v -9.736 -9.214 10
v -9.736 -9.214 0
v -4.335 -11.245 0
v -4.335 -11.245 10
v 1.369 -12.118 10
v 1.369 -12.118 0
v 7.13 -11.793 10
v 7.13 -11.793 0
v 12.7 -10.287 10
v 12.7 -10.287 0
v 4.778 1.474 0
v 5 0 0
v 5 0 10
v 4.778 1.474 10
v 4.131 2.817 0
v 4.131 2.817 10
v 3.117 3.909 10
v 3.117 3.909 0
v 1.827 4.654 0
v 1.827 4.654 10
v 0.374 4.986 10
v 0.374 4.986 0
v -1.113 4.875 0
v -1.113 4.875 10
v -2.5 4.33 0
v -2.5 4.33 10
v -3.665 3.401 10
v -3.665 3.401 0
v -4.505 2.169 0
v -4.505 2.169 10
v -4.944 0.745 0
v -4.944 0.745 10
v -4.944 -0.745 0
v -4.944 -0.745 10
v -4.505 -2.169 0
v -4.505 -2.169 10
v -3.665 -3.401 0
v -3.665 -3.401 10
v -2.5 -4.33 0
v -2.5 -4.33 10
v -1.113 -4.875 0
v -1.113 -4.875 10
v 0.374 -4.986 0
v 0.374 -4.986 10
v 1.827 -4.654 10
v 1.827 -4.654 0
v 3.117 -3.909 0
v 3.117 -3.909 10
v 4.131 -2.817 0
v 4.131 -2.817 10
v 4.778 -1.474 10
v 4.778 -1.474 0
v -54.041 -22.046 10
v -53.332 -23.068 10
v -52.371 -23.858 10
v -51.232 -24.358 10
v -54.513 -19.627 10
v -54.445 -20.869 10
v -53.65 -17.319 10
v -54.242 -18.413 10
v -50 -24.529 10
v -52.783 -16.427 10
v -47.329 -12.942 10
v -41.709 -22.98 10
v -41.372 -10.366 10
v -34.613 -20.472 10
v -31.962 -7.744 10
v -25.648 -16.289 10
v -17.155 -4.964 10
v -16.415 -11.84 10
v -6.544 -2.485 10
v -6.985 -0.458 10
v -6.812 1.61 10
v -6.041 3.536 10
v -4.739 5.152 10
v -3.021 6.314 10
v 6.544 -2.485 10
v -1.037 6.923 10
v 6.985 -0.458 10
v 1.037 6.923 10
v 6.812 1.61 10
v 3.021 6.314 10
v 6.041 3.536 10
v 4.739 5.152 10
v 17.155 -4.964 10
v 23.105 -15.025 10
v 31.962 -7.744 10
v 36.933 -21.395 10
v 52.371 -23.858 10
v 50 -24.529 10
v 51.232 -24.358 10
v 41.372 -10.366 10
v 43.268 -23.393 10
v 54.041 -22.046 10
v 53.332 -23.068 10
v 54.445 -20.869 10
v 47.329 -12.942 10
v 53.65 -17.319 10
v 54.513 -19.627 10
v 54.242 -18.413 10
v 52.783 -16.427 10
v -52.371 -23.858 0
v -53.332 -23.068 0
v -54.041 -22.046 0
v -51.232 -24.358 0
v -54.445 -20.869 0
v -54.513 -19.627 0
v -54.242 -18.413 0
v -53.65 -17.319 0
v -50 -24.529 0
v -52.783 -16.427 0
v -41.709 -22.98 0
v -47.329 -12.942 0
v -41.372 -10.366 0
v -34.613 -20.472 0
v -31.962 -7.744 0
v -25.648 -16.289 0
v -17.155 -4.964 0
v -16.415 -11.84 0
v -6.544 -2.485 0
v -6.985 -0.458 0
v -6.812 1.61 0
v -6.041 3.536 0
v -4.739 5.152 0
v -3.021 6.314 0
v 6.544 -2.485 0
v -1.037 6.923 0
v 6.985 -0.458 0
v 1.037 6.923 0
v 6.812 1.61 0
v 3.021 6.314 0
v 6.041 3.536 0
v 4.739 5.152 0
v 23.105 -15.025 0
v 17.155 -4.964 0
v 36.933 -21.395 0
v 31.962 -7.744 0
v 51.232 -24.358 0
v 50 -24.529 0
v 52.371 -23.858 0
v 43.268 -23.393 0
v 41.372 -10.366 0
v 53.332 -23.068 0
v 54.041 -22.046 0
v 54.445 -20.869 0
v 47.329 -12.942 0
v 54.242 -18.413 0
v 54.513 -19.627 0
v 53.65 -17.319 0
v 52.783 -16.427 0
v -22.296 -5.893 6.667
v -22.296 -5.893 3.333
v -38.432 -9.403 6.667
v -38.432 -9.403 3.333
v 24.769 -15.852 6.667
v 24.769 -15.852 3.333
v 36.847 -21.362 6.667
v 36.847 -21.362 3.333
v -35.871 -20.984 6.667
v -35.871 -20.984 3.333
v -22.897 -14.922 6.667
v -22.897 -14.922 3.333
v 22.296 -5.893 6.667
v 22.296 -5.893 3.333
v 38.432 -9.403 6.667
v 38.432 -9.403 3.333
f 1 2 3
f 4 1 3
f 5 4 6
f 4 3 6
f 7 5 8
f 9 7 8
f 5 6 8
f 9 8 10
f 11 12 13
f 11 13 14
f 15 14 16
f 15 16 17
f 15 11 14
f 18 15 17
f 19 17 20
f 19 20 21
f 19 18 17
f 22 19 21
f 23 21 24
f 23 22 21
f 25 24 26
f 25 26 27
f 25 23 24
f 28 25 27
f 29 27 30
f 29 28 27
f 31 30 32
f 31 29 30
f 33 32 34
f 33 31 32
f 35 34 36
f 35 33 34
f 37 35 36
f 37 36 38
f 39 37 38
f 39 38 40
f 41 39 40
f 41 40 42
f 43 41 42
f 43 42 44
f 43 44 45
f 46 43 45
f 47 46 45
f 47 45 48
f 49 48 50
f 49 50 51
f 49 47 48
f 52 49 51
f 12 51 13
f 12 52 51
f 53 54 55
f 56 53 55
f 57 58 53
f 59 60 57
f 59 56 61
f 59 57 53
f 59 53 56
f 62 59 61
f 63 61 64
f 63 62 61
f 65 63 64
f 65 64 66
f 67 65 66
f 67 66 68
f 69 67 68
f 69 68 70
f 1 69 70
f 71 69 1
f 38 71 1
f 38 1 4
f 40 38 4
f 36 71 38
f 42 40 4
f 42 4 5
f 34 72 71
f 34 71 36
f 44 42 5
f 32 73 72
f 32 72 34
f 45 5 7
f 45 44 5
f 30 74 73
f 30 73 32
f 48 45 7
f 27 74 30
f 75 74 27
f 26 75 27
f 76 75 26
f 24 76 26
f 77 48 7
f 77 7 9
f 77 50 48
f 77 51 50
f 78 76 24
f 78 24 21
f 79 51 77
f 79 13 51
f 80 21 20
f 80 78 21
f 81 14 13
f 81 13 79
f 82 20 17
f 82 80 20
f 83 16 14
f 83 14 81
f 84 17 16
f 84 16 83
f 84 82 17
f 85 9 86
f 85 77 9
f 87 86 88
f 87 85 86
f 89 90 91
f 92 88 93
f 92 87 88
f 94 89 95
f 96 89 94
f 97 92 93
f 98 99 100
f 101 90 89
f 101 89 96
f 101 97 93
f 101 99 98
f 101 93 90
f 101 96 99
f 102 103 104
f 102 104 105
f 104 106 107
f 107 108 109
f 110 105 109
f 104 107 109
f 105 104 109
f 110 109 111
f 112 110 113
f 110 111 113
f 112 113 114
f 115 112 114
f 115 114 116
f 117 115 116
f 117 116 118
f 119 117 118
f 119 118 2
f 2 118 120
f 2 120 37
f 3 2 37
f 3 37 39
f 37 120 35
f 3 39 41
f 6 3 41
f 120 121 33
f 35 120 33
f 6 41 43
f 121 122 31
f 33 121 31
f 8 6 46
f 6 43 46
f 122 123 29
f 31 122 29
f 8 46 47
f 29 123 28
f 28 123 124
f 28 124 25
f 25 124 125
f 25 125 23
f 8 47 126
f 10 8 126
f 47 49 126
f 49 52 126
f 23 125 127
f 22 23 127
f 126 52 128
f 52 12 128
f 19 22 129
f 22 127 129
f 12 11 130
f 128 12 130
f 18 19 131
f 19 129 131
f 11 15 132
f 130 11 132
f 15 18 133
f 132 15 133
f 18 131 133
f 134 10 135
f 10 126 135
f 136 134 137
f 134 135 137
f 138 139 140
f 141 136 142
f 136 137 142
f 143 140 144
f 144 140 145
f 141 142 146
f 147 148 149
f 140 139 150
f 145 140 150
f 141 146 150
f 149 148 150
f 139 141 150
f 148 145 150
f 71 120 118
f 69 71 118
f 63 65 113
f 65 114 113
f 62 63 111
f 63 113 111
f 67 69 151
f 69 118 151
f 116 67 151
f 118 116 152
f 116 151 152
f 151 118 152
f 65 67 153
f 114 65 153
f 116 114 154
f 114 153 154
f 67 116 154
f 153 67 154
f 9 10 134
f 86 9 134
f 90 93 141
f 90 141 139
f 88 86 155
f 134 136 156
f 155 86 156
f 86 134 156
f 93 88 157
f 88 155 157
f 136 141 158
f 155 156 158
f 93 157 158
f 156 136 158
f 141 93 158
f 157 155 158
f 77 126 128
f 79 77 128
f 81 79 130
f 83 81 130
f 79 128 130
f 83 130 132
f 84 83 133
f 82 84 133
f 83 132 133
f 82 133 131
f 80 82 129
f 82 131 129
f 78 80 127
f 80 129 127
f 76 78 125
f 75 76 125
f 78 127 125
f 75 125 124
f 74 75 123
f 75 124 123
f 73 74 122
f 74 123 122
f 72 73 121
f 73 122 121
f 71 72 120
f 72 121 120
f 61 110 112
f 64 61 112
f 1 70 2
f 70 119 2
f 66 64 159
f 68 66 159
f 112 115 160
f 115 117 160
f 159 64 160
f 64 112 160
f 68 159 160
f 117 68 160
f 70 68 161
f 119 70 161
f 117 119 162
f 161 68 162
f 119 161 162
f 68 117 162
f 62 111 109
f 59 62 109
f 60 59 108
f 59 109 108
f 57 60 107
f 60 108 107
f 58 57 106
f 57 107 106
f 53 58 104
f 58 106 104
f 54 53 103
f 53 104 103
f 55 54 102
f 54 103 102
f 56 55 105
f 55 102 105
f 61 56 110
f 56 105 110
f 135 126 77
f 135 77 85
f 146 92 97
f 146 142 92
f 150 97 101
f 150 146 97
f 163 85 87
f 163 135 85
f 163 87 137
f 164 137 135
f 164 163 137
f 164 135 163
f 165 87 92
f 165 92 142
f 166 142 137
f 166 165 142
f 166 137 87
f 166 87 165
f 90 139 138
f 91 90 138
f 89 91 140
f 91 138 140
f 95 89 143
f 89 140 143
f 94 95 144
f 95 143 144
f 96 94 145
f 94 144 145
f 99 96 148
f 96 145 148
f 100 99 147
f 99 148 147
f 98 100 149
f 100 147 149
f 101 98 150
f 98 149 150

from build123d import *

# Parameters (mm, degrees)
SKETCH1_R           = 5
BOSS_EXTRUDE2_DEPTH = 10


with BuildPart() as part:
    # Sketch1 → Boss-Extrude2 (new body)
    with BuildSketch(Plane.XY):
        with BuildLine():
            ThreePointArc((6.543934444, -2.485341424), (0, 7), (-6.543934444, -2.485341424))
            add(Edge.make_bspline(
                [(-6.543934444, -2.485341424), (-21.380303677, -6.980575662), (-40.047381701, -6.507084717), (-52.782972627, -16.427166435)],
                knots=[0.13340661, 0.13340661, 0.13340661, 0.13340661, 1, 1, 1, 1], degree=3))
            ThreePointArc((-52.782972627, -16.427166435), (-54.283149744, -21.471293509), (-50, -24.528805176))
            add(Edge.make_bspline(
                [(-50, -24.528805176), (-34.847891341, -23.200206491), (-23.436440722, -13.787418989), (-9.736135771, -9.213546422)],
                knots=[0, 0, 0, 0, 0.815262705, 0.815262705, 0.815262705, 0.815262705], degree=3))
            ThreePointArc((-9.736135771, -9.213546422), (1.368546444, -12.117530865), (12.699681517, -10.28655552))
            add(Edge.make_bspline(
                [(12.699681517, -10.28655552), (25.120949587, -15.117475017), (35.953024702, -23.297109091), (50, -24.528805176)],
                knots=[1, 1, 1, 1, 1.755800749, 1.755800749, 1.755800749, 1.755800749], degree=3))
            ThreePointArc((50, -24.528805176), (54.283149744, -21.471293509), (52.782972627, -16.427166435))
            add(Edge.make_bspline(
                [(6.543934444, -2.485341424), (21.380303677, -6.980575662), (40.047381701, -6.507084717), (52.782972627, -16.427166435)],
                knots=[0.13340661, 0.13340661, 0.13340661, 0.13340661, 1, 1, 1, 1], degree=3))
        make_face()
        Circle(SKETCH1_R, mode=Mode.SUBTRACT)
    extrude(amount=BOSS_EXTRUDE2_DEPTH)


solid = part.part
